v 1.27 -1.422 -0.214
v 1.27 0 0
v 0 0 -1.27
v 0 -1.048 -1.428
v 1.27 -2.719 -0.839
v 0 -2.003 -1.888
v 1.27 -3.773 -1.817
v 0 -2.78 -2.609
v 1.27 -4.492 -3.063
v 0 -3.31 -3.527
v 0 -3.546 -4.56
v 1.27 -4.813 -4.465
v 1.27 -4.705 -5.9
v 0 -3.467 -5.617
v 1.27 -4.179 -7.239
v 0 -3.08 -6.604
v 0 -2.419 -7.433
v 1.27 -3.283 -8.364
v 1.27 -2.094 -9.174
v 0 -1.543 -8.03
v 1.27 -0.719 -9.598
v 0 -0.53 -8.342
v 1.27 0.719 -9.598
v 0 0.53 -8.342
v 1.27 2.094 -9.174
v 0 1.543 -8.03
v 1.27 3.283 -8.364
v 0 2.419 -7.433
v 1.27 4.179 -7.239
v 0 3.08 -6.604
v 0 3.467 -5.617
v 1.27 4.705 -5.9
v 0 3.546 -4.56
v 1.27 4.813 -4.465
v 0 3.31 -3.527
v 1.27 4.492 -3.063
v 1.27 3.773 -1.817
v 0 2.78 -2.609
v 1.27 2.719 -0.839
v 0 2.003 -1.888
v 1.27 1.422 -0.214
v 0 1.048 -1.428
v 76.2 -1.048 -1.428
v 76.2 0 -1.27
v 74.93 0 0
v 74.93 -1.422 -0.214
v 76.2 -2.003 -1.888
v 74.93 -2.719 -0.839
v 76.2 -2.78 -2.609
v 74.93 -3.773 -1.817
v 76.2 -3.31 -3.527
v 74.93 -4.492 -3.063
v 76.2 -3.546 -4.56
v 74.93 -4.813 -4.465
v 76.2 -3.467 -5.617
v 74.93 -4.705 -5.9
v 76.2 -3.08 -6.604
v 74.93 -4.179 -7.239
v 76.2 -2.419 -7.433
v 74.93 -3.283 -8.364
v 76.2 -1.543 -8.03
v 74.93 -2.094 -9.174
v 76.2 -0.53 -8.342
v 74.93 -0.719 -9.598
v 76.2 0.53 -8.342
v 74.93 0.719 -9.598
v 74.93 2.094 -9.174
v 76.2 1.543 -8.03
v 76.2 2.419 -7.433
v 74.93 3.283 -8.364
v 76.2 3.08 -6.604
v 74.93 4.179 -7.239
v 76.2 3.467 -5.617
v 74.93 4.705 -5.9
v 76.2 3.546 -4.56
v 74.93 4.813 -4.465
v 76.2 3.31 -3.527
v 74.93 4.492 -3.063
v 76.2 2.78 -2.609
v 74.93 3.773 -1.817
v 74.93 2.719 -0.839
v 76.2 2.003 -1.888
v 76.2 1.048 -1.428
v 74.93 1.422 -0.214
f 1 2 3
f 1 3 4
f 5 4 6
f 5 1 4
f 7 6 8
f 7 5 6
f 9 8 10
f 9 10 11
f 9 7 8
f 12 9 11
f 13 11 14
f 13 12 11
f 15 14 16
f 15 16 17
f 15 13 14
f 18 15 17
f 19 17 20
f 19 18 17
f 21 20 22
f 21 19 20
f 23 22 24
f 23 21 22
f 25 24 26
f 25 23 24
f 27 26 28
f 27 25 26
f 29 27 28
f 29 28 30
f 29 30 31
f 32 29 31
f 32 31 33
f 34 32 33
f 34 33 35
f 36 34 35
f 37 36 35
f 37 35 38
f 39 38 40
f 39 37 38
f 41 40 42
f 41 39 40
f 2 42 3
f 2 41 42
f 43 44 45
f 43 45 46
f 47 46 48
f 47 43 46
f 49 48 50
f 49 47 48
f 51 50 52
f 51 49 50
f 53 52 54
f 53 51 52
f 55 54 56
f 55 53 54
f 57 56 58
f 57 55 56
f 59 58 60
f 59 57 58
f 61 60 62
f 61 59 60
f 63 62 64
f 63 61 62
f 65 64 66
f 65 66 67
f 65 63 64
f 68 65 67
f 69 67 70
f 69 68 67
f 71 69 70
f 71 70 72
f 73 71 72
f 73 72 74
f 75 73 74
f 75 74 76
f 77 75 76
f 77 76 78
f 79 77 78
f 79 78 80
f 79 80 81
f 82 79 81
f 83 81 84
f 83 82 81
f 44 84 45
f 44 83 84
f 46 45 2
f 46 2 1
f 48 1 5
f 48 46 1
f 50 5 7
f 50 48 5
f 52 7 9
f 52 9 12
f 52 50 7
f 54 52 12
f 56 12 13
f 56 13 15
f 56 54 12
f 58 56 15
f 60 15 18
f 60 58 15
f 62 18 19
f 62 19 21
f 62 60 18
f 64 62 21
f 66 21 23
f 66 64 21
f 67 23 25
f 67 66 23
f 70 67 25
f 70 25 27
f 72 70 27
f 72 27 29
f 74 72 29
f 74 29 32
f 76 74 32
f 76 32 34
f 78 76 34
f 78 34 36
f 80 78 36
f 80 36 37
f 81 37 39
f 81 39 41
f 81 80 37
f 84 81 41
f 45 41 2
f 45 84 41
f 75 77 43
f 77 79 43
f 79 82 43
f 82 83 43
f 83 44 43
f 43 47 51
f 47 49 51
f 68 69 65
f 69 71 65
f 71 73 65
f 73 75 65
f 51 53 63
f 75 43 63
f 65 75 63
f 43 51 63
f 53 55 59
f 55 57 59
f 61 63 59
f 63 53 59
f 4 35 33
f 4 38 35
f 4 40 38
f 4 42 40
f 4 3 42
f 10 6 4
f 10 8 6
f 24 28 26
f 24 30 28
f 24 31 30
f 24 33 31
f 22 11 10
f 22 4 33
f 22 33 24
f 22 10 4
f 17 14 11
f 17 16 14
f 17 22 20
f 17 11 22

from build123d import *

# Parameters (mm, degrees)
F0_W    = 76.2
F0_H    = 4.826
F2_SIZE = 1.27
F3_SIZE = 1.27


with BuildPart() as f1:
    # F0 (on Front) → F1 (revolve)
    with BuildSketch(Plane.XZ):
        with Locations((38.1, -2.413)):
            Rectangle(F0_W, F0_H)
    revolve(axis=Axis((38.1, 0, -4.826), (1, 0, 0)))

    # F2
    f2_edges = [f1.edges().sort_by_distance(p)[0] for p in [
        (0, 0, -9.652),
    ]]
    chamfer(f2_edges, length=F2_SIZE)

    # F3
    f3_edges = [f1.edges().sort_by_distance(p)[0] for p in [
        (76.2, 0, -9.652),
    ]]
    chamfer(f3_edges, length=F3_SIZE)


solid = f1.part
